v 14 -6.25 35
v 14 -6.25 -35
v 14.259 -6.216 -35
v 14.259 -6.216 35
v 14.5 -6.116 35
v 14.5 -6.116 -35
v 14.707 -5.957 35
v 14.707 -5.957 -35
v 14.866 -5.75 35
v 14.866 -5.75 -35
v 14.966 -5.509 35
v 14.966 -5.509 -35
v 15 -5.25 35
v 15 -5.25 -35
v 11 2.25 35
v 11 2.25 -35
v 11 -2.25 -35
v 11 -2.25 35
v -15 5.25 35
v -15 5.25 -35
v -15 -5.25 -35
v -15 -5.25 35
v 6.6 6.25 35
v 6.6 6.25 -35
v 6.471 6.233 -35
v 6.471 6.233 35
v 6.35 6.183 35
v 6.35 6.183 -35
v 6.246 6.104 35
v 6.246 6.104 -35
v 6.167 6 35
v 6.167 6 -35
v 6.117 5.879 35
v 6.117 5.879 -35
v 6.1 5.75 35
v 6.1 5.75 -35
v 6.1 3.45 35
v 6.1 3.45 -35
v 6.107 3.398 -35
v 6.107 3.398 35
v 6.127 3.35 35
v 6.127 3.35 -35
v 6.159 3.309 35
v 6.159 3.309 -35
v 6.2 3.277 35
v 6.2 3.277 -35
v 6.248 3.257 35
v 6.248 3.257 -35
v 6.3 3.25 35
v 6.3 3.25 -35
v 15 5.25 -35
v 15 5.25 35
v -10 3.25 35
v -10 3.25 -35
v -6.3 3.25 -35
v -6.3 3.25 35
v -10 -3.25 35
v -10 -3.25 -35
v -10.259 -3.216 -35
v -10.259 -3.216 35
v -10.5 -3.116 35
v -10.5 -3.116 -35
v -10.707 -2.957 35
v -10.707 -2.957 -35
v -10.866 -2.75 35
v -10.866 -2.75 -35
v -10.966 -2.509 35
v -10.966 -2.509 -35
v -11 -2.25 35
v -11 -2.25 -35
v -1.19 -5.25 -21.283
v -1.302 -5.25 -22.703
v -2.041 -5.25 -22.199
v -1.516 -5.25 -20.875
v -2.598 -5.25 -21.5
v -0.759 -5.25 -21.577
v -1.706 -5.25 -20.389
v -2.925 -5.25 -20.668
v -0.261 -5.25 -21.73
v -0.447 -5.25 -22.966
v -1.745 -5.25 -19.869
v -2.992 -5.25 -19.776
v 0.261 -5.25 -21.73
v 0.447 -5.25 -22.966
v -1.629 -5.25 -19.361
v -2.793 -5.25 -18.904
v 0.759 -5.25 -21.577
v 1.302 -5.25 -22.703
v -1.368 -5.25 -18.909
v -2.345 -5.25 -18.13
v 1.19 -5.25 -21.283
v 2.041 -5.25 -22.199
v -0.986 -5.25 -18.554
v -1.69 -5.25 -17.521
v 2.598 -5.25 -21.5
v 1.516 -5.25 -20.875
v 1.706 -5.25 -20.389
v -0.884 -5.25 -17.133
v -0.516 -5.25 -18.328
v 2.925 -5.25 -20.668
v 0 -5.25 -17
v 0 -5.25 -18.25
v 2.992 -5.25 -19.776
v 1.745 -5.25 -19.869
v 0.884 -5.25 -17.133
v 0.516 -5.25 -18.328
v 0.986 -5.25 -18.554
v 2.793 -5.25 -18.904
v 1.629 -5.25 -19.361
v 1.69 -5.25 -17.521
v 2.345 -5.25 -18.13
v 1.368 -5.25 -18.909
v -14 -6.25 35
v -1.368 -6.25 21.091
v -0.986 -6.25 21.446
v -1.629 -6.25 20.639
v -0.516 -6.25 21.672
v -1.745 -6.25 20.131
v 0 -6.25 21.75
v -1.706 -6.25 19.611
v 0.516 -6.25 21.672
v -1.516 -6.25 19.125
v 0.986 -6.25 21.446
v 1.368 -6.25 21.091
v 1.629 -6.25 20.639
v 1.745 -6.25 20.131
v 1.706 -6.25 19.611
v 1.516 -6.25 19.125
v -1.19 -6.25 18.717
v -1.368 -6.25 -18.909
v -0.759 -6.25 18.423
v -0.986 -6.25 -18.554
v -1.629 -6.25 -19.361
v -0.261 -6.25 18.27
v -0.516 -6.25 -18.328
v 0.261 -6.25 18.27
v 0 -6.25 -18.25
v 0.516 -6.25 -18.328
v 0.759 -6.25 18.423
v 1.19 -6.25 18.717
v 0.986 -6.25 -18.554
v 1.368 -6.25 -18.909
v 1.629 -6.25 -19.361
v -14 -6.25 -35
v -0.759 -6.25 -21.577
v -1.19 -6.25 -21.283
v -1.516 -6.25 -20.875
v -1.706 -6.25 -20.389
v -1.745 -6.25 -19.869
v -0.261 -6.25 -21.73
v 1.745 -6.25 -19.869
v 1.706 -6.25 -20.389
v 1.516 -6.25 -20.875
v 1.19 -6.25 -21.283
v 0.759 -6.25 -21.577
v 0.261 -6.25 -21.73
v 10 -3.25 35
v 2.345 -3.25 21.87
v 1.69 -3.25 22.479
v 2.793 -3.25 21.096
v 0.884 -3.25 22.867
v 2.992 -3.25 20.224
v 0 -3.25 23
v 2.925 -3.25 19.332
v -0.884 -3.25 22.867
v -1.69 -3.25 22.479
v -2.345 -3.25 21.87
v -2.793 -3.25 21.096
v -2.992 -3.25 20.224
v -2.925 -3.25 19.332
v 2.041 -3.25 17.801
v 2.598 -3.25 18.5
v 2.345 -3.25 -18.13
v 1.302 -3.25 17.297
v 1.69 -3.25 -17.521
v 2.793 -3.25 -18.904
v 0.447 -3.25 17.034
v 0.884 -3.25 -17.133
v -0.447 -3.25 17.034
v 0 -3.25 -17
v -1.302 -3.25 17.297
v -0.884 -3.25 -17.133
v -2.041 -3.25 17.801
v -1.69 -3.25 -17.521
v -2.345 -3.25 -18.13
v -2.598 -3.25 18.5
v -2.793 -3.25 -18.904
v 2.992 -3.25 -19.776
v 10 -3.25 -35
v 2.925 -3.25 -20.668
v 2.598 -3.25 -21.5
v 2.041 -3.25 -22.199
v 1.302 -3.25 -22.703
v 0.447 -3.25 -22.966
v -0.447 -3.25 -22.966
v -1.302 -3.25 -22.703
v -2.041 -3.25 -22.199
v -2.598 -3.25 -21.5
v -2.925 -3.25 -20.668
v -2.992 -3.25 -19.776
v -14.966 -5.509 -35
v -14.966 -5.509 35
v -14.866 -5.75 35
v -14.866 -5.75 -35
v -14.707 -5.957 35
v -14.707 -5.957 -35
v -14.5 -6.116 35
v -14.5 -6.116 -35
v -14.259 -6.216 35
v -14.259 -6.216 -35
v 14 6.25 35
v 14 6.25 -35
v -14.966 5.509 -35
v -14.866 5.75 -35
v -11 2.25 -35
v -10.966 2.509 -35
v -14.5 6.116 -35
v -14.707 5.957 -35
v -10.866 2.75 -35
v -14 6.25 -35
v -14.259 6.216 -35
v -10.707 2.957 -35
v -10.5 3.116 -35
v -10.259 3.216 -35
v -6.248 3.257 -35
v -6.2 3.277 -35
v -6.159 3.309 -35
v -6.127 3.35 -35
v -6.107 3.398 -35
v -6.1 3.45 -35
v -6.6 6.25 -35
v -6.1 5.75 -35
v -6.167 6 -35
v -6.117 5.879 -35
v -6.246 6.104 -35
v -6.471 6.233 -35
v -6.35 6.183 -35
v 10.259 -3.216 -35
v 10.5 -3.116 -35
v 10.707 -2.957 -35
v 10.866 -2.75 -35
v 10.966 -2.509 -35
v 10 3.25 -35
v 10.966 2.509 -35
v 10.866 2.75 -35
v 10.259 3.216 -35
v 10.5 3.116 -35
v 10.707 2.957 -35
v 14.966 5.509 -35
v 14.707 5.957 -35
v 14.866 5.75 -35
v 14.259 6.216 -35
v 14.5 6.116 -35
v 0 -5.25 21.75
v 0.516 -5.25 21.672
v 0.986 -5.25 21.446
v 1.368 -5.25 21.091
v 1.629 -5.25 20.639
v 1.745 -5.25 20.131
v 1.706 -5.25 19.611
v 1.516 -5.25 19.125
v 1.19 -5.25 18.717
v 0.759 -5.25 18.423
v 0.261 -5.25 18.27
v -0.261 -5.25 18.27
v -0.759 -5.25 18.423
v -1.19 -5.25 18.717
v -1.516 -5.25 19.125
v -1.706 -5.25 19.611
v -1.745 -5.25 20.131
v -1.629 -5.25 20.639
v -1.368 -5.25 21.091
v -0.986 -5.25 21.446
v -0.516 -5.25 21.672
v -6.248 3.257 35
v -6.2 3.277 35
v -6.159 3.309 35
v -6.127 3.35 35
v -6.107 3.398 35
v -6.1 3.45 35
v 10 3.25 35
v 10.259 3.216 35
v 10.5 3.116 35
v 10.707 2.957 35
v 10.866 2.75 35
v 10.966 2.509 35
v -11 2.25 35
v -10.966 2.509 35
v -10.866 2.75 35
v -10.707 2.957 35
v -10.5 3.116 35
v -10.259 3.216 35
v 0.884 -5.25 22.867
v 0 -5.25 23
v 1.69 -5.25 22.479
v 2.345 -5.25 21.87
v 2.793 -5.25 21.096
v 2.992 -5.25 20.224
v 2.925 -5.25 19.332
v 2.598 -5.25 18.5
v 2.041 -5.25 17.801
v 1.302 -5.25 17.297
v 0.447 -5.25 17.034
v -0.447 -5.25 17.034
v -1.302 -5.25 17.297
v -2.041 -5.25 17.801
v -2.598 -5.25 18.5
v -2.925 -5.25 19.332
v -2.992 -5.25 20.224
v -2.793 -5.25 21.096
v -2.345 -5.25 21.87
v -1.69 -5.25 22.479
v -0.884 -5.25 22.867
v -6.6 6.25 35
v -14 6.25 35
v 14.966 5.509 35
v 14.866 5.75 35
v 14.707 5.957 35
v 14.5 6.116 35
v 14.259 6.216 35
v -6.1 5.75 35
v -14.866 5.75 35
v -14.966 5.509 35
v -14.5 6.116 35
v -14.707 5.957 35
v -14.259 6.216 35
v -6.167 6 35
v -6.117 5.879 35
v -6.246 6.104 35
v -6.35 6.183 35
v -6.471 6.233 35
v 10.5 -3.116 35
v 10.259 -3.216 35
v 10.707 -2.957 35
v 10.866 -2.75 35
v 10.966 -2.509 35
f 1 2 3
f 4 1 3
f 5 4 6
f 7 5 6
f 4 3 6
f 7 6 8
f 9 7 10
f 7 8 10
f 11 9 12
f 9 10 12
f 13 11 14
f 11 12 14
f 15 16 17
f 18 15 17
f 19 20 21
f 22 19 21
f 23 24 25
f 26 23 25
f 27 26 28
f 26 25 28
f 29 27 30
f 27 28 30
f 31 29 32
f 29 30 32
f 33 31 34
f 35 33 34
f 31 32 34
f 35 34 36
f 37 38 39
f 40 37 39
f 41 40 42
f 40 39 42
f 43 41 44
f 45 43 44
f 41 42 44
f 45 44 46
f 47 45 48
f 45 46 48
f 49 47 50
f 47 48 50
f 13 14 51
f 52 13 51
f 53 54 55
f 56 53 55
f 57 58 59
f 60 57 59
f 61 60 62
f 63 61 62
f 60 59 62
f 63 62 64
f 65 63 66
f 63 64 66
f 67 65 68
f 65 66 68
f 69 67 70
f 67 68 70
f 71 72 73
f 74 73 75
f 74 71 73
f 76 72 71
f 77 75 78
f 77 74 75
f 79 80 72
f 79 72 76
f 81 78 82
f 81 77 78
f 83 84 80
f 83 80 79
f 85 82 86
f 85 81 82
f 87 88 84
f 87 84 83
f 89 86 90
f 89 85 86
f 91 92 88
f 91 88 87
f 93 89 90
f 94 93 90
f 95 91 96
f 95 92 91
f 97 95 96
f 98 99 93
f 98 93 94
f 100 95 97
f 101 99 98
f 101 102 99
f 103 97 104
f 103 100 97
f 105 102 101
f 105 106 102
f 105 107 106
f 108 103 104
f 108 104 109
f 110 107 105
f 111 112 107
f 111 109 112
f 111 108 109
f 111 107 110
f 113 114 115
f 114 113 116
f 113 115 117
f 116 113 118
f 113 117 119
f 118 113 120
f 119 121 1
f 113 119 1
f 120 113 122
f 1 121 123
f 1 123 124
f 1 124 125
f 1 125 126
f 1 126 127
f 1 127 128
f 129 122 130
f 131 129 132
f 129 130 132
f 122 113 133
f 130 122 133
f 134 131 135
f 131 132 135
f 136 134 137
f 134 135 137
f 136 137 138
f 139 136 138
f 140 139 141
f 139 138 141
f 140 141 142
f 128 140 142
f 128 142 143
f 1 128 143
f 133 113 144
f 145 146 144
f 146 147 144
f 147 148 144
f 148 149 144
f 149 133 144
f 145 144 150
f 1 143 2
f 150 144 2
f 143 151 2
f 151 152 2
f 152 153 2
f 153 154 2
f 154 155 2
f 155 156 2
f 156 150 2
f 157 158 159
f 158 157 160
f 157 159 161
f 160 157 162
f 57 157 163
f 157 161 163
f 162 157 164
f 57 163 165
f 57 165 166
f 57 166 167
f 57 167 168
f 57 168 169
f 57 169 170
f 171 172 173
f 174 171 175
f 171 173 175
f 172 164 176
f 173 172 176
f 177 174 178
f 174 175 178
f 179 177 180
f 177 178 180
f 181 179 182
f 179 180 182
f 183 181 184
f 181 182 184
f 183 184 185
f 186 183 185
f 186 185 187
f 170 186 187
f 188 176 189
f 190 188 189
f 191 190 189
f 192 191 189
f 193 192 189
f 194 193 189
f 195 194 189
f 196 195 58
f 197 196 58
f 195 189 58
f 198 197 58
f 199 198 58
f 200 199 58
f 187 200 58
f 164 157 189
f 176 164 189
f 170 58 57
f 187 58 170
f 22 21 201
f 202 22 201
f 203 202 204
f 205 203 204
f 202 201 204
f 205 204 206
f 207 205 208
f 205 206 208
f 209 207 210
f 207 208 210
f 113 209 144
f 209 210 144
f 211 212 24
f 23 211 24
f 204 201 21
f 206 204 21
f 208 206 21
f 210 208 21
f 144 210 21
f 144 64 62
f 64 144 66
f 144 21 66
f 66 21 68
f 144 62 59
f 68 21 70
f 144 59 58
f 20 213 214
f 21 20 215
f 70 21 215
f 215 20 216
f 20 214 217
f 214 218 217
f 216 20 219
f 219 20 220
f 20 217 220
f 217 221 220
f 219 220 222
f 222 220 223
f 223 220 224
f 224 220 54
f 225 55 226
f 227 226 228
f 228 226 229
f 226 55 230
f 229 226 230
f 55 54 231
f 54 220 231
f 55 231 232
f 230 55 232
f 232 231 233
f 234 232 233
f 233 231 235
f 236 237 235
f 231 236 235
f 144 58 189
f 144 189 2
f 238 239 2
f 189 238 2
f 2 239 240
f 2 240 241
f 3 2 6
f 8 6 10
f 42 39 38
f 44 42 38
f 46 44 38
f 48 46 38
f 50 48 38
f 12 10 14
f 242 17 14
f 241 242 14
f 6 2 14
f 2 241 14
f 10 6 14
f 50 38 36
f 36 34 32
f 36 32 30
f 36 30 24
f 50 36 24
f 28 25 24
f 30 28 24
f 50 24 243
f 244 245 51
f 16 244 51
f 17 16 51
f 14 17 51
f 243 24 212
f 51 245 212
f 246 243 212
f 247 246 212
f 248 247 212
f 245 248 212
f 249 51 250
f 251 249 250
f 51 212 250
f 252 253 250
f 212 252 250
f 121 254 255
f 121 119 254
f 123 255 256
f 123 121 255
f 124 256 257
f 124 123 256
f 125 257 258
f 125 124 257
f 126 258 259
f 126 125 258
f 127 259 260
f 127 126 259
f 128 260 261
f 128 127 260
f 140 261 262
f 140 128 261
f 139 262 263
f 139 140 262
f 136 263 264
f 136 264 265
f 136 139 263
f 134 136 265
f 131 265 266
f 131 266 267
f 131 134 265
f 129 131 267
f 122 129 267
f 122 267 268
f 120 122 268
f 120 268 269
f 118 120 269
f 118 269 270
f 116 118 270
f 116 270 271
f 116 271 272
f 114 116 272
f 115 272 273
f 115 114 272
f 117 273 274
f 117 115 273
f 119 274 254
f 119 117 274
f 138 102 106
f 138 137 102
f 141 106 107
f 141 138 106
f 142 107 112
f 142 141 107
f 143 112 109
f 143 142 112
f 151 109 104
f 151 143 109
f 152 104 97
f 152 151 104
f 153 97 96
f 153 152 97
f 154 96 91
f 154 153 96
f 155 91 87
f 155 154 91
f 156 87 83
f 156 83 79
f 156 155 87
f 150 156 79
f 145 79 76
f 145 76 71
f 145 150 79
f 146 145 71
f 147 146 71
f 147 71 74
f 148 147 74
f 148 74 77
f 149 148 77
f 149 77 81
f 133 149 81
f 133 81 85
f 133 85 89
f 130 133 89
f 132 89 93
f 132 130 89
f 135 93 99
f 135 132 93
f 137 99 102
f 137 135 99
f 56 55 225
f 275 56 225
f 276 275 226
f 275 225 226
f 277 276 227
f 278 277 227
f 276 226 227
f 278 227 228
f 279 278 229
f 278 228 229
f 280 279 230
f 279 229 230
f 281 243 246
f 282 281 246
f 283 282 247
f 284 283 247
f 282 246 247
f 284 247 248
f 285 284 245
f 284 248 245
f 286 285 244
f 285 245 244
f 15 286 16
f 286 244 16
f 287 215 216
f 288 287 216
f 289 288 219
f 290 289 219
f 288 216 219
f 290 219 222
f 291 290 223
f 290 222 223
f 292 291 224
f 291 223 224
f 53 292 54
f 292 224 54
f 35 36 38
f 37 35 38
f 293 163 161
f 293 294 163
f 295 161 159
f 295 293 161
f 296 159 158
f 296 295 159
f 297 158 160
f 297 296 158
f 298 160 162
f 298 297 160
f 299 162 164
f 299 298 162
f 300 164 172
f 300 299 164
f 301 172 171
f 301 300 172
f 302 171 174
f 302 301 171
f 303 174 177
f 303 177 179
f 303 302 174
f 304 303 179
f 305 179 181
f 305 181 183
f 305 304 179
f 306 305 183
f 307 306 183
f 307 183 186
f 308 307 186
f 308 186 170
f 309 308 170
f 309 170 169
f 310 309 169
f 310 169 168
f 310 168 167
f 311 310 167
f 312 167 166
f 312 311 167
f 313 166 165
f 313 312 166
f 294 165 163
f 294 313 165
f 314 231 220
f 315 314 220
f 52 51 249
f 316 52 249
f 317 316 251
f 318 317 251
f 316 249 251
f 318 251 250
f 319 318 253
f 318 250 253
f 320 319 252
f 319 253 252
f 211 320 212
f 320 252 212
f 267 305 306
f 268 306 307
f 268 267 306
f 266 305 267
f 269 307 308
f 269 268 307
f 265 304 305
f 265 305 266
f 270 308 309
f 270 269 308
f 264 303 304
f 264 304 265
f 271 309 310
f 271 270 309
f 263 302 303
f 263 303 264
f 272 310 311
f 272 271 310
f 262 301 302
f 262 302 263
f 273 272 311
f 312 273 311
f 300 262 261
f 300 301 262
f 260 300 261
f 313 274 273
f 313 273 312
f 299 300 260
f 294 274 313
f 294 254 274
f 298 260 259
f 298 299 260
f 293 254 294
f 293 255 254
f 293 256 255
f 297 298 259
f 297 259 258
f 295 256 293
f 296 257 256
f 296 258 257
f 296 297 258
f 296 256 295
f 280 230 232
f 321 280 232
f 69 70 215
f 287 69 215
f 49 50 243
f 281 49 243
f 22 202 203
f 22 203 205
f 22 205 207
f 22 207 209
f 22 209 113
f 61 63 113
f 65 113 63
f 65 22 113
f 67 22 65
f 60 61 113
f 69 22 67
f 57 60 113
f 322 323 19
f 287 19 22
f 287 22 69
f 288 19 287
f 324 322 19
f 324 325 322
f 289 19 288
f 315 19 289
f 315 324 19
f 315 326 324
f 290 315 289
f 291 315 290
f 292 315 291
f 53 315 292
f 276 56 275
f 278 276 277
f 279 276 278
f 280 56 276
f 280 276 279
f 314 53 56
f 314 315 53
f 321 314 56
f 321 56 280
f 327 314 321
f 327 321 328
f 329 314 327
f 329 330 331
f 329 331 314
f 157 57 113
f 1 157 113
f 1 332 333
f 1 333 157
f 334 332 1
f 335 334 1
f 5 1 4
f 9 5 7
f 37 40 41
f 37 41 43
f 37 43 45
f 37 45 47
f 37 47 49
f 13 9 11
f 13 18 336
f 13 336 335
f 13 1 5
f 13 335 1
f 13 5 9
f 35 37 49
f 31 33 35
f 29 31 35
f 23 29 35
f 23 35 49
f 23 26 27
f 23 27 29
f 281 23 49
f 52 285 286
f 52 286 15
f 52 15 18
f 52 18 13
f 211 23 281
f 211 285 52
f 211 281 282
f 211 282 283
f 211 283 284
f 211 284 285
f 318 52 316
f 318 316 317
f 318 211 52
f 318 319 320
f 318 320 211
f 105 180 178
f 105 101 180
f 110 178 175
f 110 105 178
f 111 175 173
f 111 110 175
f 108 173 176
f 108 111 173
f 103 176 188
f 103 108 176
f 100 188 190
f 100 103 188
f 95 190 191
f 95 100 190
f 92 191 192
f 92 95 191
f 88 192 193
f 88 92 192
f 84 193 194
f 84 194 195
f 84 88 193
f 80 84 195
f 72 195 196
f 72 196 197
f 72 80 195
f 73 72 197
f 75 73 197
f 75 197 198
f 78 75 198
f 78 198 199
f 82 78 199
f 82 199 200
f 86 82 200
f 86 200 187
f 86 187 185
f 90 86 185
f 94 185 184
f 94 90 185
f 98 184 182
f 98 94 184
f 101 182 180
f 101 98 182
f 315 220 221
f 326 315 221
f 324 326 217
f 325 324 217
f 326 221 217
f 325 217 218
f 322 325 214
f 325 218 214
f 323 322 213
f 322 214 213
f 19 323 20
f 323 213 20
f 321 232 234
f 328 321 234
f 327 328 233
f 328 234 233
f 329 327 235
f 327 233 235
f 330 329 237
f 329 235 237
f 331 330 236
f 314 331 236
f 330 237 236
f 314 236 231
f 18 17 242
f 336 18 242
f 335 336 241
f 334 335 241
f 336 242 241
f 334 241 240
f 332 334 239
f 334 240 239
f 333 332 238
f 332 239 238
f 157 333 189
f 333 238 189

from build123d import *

# Parameters (mm, degrees)
BOSS_EXTRUDE1_DEPTH      = 35
BOSS_EXTRUDE1_DEPTH_BACK = 35


with BuildPart() as part:
    # Sketch1 → Boss-Extrude1 (new, two sides: drawn at the far end of the back side and taken through both)
    with BuildSketch(Plane.XY.offset(-BOSS_EXTRUDE1_DEPTH_BACK)):
        with BuildLine():
            Line((-15, 5.25), (-15, -5.25))
            ThreePointArc((-15, -5.25), (-14.707106781, -5.957106781), (-14, -6.25))
            Line((-14, -6.25), (14, -6.25))
            ThreePointArc((14, -6.25), (14.707106781, -5.957106781), (15, -5.25))
            Line((15, -5.25), (15, 5.25))
            ThreePointArc((15, 5.25), (14.707106781, 5.957106781), (14, 6.25))
            Line((14, 6.25), (6.6, 6.25))
            ThreePointArc((6.6, 6.25), (6.246446609, 6.103553391), (6.1, 5.75))
            Line((6.1, 5.75), (6.1, 3.45))
            ThreePointArc((6.1, 3.45), (6.158578644, 3.308578644), (6.3, 3.25))
            Line((6.3, 3.25), (10, 3.25))
            ThreePointArc((10, 3.25), (10.707106781, 2.957106781), (11, 2.25))
            Line((11, 2.25), (11, -2.25))
            ThreePointArc((11, -2.25), (10.707106781, -2.957106781), (10, -3.25))
            Line((10, -3.25), (-10, -3.25))
            ThreePointArc((-10, -3.25), (-10.707106781, -2.957106781), (-11, -2.25))
            Line((-11, -2.25), (-11, 2.25))
            ThreePointArc((-11, 2.25), (-10.707106781, 2.957106781), (-10, 3.25))
            Line((-10, 3.25), (-6.3, 3.25))
            ThreePointArc((-6.3, 3.25), (-6.158578644, 3.308578644), (-6.1, 3.45))
            Line((-6.1, 3.45), (-6.1, 5.75))
            ThreePointArc((-6.1, 5.75), (-6.246446609, 6.103553391), (-6.6, 6.25))
            Line((-6.6, 6.25), (-14, 6.25))
            ThreePointArc((-14, 6.25), (-14.707106781, 5.957106781), (-15, 5.25))
        make_face()
    extrude(amount=BOSS_EXTRUDE1_DEPTH + BOSS_EXTRUDE1_DEPTH_BACK)

    # Sketch2 → Cut-Revolve1 (revolve, cut)
    with BuildSketch(Plane(origin=(0, 0, 0), x_dir=(0, 0, -1), z_dir=(1, 0, 0))):
        Polygon((-20, -3.25), (-17, -3.25), (-17, -5.25), (-18.25, -5.25), (-18.25, -6.25), (-20, -6.25), align=None)
    revolve(axis=Axis((0, -6.25, 20), (0, 1, 0)), mode=Mode.SUBTRACT)

    # Sketch3 → Cut-Revolve2 (revolve, cut)
    with BuildSketch(Plane(origin=(0, 0, 0), x_dir=(0, 0, -1), z_dir=(1, 0, 0))):
        Polygon((20, -3.25), (23, -3.25), (23, -5.25), (21.75, -5.25), (21.75, -6.25), (20, -6.25), align=None)
    revolve(axis=Axis((0, -6.25, -20), (0, 1, 0)), mode=Mode.SUBTRACT)


solid = part.part
